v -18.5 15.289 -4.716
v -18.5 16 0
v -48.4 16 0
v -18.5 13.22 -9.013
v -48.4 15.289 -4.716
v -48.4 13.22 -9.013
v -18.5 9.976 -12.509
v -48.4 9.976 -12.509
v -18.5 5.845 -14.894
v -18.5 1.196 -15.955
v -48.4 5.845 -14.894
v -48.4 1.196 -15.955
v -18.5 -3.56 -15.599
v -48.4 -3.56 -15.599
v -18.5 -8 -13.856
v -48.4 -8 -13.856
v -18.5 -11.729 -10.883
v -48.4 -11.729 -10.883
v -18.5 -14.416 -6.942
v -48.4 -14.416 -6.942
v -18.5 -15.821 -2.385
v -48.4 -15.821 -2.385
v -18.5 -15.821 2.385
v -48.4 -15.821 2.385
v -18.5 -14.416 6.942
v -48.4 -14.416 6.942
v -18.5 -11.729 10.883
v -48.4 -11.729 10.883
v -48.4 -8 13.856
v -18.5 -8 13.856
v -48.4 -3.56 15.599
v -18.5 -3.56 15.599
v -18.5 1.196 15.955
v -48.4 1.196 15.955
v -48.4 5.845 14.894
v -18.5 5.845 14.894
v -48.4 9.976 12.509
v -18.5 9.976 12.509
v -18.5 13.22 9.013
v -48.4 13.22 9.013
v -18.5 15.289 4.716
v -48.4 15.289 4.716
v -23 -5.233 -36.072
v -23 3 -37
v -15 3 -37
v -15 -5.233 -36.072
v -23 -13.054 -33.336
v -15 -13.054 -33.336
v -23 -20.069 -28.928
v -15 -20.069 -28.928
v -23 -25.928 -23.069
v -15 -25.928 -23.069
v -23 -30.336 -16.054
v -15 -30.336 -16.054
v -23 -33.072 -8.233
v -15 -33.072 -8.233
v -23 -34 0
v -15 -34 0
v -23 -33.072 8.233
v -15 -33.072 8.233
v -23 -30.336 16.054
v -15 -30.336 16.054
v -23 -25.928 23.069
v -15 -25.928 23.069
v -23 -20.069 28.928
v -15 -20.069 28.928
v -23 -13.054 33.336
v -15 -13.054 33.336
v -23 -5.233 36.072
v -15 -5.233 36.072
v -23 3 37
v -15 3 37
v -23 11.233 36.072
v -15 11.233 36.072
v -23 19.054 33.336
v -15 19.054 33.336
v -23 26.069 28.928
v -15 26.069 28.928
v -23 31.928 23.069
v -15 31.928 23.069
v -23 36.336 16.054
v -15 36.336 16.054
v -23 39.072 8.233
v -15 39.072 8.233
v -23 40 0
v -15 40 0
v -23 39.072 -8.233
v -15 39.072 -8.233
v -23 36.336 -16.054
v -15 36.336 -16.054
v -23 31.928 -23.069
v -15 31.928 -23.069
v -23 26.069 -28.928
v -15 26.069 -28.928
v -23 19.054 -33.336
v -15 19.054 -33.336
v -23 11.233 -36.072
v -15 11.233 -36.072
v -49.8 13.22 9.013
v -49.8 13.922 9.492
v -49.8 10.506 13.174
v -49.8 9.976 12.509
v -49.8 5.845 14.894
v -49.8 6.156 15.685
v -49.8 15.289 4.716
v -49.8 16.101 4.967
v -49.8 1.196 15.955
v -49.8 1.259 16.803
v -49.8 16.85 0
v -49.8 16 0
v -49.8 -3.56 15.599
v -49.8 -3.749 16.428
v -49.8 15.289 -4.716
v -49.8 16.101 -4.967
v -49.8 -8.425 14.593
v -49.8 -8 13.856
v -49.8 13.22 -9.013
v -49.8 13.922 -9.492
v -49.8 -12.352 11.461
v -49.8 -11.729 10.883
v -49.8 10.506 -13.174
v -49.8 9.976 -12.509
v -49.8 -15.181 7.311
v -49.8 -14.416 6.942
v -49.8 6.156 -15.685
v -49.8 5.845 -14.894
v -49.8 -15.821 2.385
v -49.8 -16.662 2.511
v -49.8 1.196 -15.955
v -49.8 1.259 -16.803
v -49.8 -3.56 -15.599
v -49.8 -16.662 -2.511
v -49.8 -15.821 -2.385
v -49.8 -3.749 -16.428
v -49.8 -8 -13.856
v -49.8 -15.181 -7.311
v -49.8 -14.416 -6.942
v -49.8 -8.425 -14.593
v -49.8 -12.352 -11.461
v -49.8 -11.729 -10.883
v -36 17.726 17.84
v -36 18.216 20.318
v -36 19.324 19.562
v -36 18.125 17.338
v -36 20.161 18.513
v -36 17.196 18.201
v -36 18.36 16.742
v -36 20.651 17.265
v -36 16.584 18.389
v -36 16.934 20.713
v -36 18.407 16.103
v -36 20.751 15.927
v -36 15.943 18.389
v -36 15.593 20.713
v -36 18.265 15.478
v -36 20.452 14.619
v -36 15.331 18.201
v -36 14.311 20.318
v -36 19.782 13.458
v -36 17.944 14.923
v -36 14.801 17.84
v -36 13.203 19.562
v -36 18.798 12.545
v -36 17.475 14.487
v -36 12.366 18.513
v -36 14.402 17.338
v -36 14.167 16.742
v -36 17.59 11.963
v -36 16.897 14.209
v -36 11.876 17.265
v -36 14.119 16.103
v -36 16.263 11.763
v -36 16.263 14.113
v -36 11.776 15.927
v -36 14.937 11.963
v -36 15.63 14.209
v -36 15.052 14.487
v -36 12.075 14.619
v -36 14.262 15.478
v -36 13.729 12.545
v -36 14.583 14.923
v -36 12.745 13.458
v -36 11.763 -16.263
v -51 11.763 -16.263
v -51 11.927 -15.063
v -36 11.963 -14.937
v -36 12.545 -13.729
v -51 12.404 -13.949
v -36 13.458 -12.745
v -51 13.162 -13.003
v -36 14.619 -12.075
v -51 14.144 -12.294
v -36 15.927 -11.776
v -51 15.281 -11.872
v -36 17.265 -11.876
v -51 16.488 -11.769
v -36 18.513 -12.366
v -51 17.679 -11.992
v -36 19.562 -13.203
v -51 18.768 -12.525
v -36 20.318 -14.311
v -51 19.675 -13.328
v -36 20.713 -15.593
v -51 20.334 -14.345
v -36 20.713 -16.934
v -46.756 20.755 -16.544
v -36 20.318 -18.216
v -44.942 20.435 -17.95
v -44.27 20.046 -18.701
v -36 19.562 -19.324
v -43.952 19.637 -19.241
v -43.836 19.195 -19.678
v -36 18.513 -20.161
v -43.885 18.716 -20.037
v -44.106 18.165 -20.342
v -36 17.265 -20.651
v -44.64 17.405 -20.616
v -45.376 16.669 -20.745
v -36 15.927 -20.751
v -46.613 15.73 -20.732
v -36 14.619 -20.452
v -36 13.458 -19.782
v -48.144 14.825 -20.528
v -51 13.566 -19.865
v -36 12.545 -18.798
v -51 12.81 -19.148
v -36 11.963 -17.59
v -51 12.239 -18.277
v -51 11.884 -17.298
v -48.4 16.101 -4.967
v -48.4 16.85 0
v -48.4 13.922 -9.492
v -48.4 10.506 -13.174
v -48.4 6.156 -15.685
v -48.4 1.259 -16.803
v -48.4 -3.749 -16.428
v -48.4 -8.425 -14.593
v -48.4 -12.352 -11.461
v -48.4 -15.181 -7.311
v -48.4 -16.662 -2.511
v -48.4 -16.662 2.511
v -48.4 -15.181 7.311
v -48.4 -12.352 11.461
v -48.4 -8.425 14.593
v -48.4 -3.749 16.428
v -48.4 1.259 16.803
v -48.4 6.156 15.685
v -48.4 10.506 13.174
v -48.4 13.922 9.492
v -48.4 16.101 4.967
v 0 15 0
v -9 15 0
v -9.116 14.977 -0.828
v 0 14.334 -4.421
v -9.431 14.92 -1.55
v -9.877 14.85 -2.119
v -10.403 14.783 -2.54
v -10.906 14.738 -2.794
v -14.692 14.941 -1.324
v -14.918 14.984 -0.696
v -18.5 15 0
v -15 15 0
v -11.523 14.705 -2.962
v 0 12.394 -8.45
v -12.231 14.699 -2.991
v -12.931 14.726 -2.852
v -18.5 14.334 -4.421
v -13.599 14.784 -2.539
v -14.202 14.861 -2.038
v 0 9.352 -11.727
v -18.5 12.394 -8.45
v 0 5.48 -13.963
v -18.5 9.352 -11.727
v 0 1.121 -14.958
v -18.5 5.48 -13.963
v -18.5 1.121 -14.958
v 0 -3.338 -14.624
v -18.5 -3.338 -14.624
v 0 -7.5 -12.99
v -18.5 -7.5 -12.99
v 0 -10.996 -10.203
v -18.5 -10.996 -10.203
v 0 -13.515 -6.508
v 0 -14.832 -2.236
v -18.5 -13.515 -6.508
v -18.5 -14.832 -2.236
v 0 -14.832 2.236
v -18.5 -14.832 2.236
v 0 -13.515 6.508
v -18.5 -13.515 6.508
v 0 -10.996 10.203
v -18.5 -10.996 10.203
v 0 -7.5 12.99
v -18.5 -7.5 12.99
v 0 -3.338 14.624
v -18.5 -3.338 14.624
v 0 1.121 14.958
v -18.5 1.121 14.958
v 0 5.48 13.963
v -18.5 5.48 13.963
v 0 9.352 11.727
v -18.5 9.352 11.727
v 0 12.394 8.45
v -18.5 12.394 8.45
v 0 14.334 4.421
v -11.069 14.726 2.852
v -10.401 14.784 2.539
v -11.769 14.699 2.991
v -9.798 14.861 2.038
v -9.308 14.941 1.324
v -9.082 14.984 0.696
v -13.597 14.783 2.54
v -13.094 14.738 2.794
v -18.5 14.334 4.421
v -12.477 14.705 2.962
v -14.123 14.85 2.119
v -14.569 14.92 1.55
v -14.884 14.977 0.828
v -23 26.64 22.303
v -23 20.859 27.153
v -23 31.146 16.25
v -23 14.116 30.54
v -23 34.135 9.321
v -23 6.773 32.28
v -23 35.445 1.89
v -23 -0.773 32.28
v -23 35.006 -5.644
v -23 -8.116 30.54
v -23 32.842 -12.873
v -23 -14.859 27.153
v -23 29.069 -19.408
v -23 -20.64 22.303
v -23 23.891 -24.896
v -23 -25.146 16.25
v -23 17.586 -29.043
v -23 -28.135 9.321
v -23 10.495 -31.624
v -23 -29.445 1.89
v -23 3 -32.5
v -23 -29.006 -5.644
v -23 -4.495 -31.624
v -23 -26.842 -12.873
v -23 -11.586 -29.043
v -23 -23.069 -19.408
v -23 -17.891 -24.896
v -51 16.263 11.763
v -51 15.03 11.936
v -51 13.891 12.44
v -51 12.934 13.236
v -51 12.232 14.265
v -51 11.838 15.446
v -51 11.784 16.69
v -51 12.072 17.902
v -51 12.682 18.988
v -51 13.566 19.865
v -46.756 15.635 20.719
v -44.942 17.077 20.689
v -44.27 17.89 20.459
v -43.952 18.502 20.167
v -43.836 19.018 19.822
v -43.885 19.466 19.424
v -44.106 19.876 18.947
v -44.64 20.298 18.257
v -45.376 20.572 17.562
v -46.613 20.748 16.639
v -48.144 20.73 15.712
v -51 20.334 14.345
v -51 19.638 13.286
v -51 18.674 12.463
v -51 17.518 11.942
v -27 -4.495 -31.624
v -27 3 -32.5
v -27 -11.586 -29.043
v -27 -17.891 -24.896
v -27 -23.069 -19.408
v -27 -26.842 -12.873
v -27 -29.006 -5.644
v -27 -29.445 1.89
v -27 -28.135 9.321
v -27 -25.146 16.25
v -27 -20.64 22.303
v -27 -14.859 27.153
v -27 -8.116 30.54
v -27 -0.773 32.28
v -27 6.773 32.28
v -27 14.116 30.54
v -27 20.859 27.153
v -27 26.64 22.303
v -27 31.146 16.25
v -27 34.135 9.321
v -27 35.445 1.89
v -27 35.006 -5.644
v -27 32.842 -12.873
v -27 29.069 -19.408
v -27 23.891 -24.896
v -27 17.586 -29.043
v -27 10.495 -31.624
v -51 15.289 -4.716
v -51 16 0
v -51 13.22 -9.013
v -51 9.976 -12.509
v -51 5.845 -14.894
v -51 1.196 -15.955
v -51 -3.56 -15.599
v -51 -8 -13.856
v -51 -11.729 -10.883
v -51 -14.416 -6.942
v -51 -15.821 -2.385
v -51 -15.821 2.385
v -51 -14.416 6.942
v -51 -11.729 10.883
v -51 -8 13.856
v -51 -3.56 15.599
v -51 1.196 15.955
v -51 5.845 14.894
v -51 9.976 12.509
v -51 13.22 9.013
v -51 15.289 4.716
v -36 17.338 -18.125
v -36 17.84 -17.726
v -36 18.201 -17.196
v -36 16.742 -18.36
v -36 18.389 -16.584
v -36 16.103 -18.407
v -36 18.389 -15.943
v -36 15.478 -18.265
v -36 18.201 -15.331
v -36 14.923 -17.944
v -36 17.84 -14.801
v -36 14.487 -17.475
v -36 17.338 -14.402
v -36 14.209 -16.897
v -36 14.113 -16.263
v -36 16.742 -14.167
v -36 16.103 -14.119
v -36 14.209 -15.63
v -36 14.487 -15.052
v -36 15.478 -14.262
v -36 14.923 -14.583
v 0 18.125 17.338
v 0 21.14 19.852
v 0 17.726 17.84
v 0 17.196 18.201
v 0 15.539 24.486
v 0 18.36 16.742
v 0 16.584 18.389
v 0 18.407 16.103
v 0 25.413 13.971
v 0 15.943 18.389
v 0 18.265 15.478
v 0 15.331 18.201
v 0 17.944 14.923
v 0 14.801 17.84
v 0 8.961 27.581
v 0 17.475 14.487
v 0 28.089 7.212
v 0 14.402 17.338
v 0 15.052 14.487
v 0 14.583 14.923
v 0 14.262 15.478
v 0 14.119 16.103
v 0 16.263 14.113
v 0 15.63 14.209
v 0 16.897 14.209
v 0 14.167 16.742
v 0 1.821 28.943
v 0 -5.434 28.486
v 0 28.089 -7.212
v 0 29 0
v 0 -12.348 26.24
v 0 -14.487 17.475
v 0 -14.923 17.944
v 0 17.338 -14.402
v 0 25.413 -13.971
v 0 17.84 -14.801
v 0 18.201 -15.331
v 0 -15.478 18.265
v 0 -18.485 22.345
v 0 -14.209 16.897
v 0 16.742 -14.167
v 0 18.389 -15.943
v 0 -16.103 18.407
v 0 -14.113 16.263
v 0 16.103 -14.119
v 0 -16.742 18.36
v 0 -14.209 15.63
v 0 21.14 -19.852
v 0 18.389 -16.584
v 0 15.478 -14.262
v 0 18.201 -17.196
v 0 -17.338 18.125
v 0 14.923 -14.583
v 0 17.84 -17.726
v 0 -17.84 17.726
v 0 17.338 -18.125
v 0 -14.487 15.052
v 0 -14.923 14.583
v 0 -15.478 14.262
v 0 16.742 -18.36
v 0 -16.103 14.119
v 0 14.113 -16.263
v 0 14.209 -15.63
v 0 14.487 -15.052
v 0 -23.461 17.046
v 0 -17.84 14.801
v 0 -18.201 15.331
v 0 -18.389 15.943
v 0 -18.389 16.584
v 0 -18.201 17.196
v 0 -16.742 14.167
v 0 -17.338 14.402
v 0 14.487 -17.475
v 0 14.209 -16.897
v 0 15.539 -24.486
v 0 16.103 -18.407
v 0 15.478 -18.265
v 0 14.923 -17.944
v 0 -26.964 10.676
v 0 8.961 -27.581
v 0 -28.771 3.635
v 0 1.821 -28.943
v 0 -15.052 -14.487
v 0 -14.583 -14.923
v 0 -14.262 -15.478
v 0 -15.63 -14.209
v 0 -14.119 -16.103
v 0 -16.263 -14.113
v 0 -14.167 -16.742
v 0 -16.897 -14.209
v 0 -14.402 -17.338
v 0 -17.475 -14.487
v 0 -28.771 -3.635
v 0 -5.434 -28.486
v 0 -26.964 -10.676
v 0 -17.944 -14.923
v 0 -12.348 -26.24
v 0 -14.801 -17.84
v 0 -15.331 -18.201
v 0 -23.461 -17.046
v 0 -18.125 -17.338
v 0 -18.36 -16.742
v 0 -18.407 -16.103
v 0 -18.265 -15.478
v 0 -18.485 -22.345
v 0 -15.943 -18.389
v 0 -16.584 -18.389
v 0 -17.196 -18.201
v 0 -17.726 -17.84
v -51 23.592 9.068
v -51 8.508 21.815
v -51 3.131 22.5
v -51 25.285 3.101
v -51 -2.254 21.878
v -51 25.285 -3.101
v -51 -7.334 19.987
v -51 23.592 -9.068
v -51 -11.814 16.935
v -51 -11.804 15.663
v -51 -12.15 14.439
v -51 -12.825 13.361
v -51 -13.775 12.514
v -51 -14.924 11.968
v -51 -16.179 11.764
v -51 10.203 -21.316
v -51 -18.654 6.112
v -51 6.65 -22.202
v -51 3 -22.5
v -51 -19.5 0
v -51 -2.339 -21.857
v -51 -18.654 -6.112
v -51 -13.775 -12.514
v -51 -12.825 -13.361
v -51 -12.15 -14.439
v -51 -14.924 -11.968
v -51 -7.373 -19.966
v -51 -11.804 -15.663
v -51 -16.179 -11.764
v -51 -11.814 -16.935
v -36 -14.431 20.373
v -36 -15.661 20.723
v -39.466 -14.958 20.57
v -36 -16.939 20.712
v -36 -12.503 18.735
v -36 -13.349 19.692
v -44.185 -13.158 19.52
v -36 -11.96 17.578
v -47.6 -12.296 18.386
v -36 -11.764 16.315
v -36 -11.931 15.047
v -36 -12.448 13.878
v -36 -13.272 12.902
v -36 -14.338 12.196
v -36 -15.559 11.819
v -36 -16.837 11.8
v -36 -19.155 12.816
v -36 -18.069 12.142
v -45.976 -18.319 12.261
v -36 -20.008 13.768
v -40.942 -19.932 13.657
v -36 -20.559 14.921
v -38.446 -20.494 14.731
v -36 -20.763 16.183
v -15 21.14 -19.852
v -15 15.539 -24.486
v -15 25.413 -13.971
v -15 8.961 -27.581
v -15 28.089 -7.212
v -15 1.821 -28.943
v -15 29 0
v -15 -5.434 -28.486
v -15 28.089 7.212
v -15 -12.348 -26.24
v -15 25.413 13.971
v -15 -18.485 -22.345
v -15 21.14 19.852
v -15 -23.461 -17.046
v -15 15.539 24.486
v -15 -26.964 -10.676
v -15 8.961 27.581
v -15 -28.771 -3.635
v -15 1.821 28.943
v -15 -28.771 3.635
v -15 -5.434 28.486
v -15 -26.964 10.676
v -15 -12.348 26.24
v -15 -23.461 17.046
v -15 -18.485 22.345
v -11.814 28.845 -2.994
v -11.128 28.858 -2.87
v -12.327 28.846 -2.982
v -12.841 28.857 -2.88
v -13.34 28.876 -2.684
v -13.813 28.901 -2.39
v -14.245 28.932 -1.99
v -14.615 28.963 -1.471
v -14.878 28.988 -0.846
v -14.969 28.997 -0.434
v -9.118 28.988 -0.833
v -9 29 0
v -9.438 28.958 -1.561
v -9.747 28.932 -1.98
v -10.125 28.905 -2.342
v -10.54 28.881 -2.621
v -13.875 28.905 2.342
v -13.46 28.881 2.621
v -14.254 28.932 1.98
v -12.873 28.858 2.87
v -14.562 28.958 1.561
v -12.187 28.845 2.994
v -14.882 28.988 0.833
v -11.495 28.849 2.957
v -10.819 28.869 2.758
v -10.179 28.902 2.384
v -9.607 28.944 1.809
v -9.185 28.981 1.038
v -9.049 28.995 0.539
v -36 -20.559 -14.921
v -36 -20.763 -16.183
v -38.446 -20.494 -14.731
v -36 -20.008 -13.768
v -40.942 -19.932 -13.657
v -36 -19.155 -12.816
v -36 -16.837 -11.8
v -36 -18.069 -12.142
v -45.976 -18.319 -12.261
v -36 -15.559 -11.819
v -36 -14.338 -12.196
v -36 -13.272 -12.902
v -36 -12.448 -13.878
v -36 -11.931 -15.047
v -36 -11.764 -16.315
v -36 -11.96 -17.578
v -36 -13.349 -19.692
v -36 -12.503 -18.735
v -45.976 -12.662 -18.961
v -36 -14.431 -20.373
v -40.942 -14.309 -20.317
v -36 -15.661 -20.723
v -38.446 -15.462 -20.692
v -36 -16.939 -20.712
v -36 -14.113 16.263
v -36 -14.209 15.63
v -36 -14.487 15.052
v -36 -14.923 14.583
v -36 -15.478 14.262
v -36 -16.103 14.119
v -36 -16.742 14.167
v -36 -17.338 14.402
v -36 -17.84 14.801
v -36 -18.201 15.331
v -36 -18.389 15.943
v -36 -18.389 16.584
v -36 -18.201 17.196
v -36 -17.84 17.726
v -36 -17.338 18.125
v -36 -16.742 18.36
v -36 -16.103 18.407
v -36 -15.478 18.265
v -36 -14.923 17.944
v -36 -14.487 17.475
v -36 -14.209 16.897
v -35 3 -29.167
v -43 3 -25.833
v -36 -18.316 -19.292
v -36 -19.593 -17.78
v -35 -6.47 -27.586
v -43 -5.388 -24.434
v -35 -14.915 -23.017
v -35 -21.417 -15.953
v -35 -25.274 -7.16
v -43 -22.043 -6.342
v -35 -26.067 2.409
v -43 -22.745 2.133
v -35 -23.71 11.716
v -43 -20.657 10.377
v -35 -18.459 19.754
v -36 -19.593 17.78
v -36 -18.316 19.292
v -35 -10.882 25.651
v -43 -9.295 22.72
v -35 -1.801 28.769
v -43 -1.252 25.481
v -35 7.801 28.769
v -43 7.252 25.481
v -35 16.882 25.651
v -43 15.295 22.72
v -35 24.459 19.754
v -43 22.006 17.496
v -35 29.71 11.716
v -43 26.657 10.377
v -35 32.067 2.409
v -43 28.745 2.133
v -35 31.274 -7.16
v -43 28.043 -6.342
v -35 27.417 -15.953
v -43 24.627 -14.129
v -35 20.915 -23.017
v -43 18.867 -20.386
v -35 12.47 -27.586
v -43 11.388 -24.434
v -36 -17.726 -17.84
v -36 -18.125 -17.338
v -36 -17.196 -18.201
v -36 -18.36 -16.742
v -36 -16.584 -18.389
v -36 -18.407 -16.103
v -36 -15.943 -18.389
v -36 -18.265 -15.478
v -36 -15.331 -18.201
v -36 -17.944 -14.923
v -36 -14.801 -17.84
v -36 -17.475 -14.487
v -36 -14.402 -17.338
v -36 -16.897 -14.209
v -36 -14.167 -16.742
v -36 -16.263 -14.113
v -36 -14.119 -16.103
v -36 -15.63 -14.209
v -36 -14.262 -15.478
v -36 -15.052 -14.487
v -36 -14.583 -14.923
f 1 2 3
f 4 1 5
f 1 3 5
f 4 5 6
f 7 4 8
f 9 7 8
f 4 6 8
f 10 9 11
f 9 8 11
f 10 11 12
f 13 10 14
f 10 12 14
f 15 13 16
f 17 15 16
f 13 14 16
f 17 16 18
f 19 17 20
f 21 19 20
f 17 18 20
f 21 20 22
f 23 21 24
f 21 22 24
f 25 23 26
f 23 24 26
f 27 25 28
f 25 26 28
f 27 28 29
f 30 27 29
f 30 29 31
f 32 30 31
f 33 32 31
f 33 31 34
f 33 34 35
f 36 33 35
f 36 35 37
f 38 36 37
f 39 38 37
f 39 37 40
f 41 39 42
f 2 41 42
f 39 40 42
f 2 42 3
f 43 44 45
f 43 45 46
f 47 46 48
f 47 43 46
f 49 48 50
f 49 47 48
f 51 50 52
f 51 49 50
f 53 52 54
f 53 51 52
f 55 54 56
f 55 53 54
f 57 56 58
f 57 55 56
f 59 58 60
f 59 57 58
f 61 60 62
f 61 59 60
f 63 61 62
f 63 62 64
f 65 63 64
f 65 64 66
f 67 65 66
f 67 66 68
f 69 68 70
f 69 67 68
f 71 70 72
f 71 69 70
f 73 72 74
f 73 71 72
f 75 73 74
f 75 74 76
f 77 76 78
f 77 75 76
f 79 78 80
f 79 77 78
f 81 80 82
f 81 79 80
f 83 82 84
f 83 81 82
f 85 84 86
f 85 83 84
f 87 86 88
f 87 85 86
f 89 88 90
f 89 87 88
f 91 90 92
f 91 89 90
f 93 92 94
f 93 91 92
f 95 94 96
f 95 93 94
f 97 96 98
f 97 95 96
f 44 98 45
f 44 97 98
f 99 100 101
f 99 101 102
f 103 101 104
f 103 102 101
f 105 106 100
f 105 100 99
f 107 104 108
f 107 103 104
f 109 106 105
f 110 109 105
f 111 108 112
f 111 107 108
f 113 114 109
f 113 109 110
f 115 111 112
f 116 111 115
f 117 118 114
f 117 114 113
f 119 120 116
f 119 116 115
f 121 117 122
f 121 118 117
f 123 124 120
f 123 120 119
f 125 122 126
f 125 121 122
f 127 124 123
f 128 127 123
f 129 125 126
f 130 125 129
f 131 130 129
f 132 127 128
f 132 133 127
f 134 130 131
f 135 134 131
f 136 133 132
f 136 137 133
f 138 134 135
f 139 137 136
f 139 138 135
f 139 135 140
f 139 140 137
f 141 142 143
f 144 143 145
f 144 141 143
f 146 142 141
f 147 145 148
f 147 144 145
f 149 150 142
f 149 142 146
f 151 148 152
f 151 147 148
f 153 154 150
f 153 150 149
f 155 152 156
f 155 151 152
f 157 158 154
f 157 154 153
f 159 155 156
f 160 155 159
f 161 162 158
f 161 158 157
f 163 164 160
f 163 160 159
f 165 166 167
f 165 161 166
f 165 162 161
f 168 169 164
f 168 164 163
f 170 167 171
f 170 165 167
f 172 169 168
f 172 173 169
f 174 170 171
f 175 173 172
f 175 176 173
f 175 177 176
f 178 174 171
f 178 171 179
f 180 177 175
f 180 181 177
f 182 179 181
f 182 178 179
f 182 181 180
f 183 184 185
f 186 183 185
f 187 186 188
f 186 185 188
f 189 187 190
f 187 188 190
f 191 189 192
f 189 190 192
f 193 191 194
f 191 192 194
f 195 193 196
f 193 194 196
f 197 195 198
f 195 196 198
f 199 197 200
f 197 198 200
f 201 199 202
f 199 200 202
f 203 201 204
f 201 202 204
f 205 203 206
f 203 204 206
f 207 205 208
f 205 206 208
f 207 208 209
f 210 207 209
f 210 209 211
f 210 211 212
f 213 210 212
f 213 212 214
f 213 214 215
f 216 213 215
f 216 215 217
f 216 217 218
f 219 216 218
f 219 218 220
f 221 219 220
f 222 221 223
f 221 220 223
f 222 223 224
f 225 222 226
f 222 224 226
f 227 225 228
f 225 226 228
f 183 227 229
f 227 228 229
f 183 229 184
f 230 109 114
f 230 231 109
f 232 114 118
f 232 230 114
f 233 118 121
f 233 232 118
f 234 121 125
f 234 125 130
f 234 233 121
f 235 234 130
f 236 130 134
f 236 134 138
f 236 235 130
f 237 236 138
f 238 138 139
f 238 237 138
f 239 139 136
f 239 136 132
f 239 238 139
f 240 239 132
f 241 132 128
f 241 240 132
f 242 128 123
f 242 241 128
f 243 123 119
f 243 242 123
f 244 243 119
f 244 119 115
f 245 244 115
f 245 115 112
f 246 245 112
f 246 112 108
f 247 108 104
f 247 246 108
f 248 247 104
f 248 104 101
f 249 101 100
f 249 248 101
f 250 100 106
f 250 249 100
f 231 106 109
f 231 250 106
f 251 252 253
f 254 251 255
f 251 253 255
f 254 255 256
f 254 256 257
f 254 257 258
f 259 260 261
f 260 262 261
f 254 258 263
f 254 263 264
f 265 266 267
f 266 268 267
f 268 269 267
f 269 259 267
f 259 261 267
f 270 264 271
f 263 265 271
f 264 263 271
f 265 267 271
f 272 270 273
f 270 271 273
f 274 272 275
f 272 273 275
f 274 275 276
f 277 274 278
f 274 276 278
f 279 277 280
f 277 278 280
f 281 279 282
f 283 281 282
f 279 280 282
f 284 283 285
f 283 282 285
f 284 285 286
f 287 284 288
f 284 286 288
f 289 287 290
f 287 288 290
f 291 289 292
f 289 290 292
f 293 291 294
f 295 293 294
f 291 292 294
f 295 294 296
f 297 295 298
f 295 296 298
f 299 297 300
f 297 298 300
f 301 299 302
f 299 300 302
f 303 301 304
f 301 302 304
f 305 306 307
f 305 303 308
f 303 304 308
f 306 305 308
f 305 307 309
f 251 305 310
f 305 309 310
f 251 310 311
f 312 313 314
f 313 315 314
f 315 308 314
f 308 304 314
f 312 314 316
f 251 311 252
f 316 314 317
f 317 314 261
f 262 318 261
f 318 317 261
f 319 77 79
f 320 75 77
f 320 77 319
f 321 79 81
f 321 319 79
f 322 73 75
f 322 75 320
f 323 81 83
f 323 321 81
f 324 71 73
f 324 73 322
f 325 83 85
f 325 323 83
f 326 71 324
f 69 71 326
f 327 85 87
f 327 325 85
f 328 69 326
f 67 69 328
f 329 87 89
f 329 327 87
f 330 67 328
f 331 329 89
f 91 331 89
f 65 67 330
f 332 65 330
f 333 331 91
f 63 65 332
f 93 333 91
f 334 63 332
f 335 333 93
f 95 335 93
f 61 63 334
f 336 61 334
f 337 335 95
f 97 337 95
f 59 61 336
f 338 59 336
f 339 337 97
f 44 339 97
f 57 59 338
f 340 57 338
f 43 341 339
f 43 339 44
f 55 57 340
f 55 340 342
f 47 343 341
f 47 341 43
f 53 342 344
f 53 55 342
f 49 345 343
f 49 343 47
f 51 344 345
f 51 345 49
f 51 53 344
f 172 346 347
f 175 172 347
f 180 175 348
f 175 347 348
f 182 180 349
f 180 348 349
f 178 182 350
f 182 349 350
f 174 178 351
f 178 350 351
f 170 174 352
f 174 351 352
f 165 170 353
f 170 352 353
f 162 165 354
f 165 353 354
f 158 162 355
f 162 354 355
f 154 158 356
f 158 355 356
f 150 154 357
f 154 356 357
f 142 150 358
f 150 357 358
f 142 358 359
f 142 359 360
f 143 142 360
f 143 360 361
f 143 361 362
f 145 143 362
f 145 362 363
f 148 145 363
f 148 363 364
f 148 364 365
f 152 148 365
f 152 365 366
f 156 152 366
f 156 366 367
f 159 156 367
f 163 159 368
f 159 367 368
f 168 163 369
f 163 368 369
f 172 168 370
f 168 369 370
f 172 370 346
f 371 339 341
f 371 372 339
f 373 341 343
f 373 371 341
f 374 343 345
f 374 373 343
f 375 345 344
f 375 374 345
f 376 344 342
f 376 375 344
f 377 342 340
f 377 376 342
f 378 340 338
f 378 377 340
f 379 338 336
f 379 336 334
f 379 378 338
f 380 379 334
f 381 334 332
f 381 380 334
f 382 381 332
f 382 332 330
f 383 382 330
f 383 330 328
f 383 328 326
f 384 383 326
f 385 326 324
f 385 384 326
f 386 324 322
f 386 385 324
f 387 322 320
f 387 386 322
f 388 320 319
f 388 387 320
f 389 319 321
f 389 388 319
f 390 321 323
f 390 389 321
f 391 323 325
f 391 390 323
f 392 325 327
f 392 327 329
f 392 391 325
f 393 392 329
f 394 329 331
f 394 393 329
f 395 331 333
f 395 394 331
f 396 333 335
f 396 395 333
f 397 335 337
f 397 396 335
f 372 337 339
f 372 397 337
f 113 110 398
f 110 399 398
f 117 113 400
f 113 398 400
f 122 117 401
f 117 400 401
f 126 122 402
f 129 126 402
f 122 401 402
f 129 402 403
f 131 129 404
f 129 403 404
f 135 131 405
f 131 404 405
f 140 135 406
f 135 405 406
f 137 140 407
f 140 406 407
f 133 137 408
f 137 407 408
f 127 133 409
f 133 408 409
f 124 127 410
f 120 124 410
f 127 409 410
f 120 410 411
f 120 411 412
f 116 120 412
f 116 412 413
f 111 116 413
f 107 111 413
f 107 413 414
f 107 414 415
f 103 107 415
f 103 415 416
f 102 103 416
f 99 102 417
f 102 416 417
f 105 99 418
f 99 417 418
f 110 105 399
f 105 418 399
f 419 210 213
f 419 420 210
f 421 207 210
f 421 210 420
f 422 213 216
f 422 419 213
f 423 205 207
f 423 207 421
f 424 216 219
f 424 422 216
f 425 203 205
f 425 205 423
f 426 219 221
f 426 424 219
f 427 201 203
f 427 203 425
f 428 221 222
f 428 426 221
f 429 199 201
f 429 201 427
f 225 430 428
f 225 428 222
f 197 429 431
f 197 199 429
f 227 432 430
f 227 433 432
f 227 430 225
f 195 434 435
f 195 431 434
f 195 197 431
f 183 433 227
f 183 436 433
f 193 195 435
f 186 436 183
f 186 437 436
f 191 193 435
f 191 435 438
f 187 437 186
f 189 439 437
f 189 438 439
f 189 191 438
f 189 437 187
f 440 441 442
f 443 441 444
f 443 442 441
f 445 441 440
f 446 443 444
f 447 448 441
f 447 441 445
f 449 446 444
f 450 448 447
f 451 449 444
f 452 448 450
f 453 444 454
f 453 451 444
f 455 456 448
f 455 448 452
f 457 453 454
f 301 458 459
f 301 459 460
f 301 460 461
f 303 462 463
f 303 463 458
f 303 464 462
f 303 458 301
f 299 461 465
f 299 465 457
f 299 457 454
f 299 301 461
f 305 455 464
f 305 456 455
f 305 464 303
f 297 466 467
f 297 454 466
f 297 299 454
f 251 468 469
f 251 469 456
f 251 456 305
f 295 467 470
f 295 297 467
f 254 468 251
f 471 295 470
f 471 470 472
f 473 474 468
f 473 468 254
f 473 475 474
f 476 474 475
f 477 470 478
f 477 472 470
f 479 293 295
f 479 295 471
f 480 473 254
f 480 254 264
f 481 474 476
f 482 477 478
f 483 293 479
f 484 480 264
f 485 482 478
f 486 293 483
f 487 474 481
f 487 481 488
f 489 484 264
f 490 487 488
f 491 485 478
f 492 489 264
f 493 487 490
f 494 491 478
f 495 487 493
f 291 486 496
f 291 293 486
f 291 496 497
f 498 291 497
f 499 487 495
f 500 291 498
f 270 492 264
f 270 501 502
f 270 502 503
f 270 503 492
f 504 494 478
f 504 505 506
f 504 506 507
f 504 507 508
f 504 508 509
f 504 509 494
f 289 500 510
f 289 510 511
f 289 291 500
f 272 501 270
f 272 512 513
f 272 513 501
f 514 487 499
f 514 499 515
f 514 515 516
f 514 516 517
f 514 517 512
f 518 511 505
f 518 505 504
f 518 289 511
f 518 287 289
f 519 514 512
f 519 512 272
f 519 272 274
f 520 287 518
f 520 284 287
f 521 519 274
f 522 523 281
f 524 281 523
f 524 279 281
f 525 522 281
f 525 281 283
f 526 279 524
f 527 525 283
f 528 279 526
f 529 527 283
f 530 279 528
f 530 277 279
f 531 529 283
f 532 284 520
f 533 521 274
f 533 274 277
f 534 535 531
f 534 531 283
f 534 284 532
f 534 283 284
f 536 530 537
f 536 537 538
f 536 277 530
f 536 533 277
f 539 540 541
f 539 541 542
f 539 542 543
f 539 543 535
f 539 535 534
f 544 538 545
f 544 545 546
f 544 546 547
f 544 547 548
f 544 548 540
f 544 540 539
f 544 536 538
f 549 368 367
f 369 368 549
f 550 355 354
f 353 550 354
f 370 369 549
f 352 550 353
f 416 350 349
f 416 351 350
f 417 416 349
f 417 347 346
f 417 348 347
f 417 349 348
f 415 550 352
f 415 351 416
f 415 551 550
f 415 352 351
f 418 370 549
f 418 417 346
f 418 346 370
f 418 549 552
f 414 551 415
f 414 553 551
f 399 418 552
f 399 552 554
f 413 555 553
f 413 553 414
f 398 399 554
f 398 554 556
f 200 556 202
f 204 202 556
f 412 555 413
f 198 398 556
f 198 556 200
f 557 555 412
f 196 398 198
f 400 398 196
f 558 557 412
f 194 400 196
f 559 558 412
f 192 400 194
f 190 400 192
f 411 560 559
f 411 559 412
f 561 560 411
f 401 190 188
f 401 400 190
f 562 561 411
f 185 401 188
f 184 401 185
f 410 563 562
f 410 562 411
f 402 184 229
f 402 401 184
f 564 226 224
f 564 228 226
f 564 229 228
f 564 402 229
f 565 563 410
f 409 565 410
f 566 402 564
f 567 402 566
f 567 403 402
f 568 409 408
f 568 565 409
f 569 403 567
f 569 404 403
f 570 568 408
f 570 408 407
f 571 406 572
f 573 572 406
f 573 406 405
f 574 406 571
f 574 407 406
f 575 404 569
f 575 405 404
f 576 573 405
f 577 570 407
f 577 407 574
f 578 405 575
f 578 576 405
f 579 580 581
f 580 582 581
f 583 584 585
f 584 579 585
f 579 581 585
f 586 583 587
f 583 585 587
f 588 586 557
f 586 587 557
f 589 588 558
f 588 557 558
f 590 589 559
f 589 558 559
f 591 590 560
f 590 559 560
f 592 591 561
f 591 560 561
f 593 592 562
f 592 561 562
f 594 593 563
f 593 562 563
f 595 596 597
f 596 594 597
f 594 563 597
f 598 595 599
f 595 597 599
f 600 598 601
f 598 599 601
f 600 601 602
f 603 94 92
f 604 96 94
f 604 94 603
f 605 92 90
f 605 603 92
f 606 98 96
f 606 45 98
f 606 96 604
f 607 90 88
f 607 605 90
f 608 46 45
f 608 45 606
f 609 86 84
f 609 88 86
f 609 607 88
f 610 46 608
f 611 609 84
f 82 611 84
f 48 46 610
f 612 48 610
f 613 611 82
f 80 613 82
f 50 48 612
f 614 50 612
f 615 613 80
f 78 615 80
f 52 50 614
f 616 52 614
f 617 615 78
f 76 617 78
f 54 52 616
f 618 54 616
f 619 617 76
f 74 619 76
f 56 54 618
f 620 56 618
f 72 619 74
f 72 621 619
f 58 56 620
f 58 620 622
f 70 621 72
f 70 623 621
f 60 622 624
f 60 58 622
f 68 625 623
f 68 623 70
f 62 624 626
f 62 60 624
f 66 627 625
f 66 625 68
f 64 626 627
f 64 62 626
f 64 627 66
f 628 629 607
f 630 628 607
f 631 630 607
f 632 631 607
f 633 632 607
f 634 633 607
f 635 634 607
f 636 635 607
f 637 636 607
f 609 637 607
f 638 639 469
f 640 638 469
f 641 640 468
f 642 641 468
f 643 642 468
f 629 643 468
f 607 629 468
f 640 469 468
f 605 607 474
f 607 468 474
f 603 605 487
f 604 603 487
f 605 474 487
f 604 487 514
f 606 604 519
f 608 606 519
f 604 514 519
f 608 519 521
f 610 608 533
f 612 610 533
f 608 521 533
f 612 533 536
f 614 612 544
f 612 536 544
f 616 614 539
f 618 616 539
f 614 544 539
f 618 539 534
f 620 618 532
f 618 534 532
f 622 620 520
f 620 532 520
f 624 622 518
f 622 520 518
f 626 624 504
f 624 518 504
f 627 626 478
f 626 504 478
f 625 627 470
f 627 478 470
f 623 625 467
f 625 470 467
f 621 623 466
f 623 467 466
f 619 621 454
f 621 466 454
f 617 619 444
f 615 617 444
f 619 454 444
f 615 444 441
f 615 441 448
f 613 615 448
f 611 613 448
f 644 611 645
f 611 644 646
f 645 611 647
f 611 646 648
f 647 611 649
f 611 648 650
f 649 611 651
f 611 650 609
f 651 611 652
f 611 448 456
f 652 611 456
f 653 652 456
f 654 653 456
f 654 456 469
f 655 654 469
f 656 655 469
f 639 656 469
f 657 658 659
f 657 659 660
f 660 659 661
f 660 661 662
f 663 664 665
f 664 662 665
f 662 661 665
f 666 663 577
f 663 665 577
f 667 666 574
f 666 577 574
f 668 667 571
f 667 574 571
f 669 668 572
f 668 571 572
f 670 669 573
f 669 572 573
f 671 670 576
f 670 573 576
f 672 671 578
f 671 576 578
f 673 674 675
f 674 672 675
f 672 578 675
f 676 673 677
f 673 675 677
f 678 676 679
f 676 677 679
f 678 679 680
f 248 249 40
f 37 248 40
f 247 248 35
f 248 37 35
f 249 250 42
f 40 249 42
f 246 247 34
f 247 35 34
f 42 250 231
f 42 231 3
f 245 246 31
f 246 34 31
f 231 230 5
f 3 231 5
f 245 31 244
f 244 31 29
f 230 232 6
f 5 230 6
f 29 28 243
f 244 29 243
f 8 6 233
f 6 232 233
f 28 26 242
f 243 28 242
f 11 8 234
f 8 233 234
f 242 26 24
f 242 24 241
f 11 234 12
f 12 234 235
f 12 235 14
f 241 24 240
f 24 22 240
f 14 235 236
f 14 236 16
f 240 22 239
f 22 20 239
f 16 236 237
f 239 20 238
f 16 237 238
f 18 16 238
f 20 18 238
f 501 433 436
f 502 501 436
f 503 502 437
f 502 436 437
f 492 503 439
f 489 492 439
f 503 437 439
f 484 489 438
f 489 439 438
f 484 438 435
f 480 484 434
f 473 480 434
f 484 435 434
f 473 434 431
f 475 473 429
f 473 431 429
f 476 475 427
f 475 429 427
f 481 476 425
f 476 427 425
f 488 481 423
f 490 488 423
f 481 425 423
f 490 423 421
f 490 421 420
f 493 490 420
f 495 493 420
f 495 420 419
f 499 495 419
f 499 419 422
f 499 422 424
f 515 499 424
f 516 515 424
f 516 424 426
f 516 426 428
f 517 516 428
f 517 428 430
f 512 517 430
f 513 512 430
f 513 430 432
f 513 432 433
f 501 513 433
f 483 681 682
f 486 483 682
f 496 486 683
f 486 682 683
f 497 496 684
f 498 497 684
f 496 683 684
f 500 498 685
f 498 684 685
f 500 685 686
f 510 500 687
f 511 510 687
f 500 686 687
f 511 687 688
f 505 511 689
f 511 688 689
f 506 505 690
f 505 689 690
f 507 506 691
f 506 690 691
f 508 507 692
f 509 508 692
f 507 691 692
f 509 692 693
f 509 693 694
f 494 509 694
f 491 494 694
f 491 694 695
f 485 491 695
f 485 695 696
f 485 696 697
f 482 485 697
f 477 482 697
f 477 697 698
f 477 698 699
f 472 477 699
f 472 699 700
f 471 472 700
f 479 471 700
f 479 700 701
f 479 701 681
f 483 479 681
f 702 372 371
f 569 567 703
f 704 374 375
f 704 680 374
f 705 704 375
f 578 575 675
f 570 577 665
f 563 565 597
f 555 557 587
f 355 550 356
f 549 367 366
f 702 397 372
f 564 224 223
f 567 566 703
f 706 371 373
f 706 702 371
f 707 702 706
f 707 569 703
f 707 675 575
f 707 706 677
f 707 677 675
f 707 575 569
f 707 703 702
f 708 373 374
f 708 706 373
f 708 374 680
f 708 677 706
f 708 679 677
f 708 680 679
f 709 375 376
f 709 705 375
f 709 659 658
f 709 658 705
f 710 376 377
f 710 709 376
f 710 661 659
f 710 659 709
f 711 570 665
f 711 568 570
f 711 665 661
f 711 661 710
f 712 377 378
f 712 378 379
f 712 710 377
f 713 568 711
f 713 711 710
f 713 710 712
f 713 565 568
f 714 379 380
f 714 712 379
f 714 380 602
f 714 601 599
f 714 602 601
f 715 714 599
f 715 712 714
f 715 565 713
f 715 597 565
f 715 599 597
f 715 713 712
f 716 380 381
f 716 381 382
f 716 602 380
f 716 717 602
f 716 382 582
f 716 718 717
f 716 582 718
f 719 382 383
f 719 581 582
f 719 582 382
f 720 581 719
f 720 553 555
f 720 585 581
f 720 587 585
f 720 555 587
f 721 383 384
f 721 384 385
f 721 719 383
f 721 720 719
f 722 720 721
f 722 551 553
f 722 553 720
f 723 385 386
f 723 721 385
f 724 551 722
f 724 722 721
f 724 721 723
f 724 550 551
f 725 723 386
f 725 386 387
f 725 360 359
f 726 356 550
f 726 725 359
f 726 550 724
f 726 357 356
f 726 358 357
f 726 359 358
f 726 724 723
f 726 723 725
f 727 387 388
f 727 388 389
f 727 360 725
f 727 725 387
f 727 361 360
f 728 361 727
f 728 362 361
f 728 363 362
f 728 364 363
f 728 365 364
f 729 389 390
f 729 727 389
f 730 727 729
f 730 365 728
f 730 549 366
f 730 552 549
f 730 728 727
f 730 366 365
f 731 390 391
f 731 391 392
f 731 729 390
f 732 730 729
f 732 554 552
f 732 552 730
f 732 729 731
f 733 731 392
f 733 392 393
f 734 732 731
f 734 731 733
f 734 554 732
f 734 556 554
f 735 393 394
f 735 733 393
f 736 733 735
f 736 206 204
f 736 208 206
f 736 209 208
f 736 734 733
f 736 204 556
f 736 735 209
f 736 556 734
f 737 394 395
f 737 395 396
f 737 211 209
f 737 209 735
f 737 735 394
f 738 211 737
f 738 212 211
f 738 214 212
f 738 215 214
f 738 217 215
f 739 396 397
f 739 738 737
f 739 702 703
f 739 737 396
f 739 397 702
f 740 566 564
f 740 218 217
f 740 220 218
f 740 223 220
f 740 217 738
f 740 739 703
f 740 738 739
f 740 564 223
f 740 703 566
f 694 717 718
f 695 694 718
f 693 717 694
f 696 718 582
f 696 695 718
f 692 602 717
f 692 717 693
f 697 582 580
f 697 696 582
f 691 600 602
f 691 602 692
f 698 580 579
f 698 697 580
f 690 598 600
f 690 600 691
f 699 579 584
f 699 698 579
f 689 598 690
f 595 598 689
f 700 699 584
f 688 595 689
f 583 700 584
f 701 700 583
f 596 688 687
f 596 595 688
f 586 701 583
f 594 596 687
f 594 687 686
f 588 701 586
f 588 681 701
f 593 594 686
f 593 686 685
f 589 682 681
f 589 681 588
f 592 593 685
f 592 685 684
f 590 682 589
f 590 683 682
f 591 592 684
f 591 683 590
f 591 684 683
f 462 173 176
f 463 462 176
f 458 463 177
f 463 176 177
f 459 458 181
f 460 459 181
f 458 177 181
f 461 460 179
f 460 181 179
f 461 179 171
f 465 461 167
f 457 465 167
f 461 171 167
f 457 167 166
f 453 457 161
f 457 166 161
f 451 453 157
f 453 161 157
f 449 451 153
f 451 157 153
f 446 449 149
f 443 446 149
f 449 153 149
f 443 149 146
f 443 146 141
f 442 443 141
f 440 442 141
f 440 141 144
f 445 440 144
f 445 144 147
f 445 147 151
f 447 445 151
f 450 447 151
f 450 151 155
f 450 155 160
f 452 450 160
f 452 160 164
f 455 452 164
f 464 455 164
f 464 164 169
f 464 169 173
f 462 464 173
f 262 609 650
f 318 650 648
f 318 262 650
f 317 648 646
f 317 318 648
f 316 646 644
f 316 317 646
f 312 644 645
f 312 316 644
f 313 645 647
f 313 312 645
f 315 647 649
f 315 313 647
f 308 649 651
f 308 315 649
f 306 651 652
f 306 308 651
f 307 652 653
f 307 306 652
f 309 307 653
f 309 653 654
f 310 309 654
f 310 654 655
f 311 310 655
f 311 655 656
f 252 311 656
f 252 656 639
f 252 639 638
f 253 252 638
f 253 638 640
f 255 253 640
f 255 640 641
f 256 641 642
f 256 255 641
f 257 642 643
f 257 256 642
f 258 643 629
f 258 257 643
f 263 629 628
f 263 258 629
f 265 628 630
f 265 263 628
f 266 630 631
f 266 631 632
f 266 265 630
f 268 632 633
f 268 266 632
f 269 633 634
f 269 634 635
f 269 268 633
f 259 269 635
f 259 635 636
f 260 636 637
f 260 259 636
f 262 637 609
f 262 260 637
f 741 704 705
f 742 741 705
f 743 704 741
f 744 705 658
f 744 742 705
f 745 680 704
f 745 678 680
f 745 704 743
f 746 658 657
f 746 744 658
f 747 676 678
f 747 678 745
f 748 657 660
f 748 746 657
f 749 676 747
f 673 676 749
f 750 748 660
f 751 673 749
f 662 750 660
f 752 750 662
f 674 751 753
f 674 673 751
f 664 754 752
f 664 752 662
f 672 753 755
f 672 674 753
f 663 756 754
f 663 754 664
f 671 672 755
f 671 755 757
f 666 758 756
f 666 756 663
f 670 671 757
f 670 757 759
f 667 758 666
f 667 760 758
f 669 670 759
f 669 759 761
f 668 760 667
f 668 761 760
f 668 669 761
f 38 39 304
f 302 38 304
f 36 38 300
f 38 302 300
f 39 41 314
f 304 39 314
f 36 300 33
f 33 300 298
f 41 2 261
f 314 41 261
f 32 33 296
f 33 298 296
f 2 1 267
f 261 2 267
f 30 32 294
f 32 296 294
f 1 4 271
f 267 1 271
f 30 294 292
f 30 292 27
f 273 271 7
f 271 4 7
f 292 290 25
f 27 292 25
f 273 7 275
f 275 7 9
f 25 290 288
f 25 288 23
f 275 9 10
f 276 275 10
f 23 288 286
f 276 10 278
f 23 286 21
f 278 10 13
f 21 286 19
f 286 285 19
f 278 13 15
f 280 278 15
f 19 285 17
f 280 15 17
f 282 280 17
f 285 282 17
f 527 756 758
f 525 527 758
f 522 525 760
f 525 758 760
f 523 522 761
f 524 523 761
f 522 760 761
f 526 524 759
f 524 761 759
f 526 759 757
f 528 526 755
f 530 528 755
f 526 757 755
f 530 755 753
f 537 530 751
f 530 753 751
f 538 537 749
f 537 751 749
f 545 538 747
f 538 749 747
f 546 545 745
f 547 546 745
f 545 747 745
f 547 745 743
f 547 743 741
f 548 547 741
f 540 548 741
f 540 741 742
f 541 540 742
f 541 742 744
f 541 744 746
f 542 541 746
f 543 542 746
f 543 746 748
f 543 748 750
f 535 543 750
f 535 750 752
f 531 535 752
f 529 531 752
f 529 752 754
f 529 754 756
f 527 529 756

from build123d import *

# Parameters (mm, degrees)
ESQUISSE2_W                  = 15
ESQUISSE2_H                  = 29
ESQUISSE6_R                  = 4.5
ENL_V_MAT_EXTRU_1_DEPTH      = 15
ESQUISSE7_R                  = 2.15
ENL_V_MAT_EXTRU_2_DEPTH      = 66.306967469
R_P_TITION_CIRCULAIRE1_COUNT = 4
ESQUISSE14_W                 = 1.4
ESQUISSE14_H                 = 0.85
ESQUISSE15_R                 = 3
EXTRUSION1_DEPTH             = 75.632432697


with BuildPart() as part:
    # Esquisse2 → Base-Révolution (revolve)
    with BuildSketch(Plane.XY):
        with Locations((-7.5, 14.5)):
            Rectangle(ESQUISSE2_W, ESQUISSE2_H)
    revolve(axis=Axis((10, 0, 0), (-1, 0, 0)))

    # Esquisse4 → Boss.-Révol.1 (revolve)
    with BuildSketch(Plane.XY, mode=Mode.PRIVATE) as boss_r_vol_1_sk:
        Polygon((-15, 3), (-15, 40), (-23, 40), (-23, 35.5), (-27, 35.5), (-51, 25.5), (-51, 3), align=None)
    revolve(boss_r_vol_1_sk.sketch.rotate(Axis((-51, 3, 0), (-1, 0, 0)), 90), axis=Axis((-51, 3, 0), (-1, 0, 0)))

    # Esquisse6 → Enlèv. mat.-Extru.1 (cut)
    with BuildSketch(Plane.ZY.offset(51)):
        with Locations(Location((-16.263455967, 16.263455967, 0), (0, 0, 270))):
            Circle(ESQUISSE6_R)
    enl_v_mat_extru_1 = extrude(amount=-ENL_V_MAT_EXTRU_1_DEPTH, mode=Mode.SUBTRACT)

    # Esquisse7 → Enlèv. mat.-Extru.2 (cut, through all)
    with BuildSketch(Plane.ZY.offset(36)):
        with Locations(Location((-16.263455967, 16.263455967, 0), (0, 0, 270))):
            Circle(ESQUISSE7_R)
    enl_v_mat_extru_2 = extrude(amount=-ENL_V_MAT_EXTRU_2_DEPTH, mode=Mode.SUBTRACT)

    # Répétition circulaire1: Enlèv. mat.-Extru.1, Enlèv. mat.-Extru.2 ×4 about axis
    r_p_tition_circulaire1_axis = Axis((0, 0, 0), (1, 0, 0))
    add([enl_v_mat_extru_1.rotate(r_p_tition_circulaire1_axis, i * 360 / R_P_TITION_CIRCULAIRE1_COUNT) for i in range(1, R_P_TITION_CIRCULAIRE1_COUNT)], mode=Mode.SUBTRACT)
    add([enl_v_mat_extru_2.rotate(r_p_tition_circulaire1_axis, i * 360 / R_P_TITION_CIRCULAIRE1_COUNT) for i in range(1, R_P_TITION_CIRCULAIRE1_COUNT)], mode=Mode.SUBTRACT)

    # Esquisse13 → Enlèvement de matière-Révolution1 (revolve, cut)
    with BuildSketch(Plane.XY):
        Polygon((3, 0), (3, 15), (-18.5, 15), (-18.5, 16), (-51, 16), (-51, 0), align=None)
    revolve(axis=Axis((3, 0, 0), (-1, 0, 0)), mode=Mode.SUBTRACT)

    # Esquisse14 → Enlèvement de matière-Révolution2 (revolve, cut)
    with BuildSketch(Plane.XY):
        with Locations((-49.1, 16.425)):
            Rectangle(ESQUISSE14_W, ESQUISSE14_H)
    revolve(axis=Axis((-44.664297448, 0, 0), (-1, 0, 0)), mode=Mode.SUBTRACT)

    # Esquisse15 → Extrusion1 (cut, through all)
    with BuildSketch(Plane(origin=(0, 0, 0), x_dir=(1, 0, 0), z_dir=(0, 1, 0))):
        with Locations(Location((-12, 0, 0), (0, 0, 180))):
            Circle(ESQUISSE15_R)
    extrude(amount=EXTRUSION1_DEPTH, mode=Mode.SUBTRACT)


solid = part.part
